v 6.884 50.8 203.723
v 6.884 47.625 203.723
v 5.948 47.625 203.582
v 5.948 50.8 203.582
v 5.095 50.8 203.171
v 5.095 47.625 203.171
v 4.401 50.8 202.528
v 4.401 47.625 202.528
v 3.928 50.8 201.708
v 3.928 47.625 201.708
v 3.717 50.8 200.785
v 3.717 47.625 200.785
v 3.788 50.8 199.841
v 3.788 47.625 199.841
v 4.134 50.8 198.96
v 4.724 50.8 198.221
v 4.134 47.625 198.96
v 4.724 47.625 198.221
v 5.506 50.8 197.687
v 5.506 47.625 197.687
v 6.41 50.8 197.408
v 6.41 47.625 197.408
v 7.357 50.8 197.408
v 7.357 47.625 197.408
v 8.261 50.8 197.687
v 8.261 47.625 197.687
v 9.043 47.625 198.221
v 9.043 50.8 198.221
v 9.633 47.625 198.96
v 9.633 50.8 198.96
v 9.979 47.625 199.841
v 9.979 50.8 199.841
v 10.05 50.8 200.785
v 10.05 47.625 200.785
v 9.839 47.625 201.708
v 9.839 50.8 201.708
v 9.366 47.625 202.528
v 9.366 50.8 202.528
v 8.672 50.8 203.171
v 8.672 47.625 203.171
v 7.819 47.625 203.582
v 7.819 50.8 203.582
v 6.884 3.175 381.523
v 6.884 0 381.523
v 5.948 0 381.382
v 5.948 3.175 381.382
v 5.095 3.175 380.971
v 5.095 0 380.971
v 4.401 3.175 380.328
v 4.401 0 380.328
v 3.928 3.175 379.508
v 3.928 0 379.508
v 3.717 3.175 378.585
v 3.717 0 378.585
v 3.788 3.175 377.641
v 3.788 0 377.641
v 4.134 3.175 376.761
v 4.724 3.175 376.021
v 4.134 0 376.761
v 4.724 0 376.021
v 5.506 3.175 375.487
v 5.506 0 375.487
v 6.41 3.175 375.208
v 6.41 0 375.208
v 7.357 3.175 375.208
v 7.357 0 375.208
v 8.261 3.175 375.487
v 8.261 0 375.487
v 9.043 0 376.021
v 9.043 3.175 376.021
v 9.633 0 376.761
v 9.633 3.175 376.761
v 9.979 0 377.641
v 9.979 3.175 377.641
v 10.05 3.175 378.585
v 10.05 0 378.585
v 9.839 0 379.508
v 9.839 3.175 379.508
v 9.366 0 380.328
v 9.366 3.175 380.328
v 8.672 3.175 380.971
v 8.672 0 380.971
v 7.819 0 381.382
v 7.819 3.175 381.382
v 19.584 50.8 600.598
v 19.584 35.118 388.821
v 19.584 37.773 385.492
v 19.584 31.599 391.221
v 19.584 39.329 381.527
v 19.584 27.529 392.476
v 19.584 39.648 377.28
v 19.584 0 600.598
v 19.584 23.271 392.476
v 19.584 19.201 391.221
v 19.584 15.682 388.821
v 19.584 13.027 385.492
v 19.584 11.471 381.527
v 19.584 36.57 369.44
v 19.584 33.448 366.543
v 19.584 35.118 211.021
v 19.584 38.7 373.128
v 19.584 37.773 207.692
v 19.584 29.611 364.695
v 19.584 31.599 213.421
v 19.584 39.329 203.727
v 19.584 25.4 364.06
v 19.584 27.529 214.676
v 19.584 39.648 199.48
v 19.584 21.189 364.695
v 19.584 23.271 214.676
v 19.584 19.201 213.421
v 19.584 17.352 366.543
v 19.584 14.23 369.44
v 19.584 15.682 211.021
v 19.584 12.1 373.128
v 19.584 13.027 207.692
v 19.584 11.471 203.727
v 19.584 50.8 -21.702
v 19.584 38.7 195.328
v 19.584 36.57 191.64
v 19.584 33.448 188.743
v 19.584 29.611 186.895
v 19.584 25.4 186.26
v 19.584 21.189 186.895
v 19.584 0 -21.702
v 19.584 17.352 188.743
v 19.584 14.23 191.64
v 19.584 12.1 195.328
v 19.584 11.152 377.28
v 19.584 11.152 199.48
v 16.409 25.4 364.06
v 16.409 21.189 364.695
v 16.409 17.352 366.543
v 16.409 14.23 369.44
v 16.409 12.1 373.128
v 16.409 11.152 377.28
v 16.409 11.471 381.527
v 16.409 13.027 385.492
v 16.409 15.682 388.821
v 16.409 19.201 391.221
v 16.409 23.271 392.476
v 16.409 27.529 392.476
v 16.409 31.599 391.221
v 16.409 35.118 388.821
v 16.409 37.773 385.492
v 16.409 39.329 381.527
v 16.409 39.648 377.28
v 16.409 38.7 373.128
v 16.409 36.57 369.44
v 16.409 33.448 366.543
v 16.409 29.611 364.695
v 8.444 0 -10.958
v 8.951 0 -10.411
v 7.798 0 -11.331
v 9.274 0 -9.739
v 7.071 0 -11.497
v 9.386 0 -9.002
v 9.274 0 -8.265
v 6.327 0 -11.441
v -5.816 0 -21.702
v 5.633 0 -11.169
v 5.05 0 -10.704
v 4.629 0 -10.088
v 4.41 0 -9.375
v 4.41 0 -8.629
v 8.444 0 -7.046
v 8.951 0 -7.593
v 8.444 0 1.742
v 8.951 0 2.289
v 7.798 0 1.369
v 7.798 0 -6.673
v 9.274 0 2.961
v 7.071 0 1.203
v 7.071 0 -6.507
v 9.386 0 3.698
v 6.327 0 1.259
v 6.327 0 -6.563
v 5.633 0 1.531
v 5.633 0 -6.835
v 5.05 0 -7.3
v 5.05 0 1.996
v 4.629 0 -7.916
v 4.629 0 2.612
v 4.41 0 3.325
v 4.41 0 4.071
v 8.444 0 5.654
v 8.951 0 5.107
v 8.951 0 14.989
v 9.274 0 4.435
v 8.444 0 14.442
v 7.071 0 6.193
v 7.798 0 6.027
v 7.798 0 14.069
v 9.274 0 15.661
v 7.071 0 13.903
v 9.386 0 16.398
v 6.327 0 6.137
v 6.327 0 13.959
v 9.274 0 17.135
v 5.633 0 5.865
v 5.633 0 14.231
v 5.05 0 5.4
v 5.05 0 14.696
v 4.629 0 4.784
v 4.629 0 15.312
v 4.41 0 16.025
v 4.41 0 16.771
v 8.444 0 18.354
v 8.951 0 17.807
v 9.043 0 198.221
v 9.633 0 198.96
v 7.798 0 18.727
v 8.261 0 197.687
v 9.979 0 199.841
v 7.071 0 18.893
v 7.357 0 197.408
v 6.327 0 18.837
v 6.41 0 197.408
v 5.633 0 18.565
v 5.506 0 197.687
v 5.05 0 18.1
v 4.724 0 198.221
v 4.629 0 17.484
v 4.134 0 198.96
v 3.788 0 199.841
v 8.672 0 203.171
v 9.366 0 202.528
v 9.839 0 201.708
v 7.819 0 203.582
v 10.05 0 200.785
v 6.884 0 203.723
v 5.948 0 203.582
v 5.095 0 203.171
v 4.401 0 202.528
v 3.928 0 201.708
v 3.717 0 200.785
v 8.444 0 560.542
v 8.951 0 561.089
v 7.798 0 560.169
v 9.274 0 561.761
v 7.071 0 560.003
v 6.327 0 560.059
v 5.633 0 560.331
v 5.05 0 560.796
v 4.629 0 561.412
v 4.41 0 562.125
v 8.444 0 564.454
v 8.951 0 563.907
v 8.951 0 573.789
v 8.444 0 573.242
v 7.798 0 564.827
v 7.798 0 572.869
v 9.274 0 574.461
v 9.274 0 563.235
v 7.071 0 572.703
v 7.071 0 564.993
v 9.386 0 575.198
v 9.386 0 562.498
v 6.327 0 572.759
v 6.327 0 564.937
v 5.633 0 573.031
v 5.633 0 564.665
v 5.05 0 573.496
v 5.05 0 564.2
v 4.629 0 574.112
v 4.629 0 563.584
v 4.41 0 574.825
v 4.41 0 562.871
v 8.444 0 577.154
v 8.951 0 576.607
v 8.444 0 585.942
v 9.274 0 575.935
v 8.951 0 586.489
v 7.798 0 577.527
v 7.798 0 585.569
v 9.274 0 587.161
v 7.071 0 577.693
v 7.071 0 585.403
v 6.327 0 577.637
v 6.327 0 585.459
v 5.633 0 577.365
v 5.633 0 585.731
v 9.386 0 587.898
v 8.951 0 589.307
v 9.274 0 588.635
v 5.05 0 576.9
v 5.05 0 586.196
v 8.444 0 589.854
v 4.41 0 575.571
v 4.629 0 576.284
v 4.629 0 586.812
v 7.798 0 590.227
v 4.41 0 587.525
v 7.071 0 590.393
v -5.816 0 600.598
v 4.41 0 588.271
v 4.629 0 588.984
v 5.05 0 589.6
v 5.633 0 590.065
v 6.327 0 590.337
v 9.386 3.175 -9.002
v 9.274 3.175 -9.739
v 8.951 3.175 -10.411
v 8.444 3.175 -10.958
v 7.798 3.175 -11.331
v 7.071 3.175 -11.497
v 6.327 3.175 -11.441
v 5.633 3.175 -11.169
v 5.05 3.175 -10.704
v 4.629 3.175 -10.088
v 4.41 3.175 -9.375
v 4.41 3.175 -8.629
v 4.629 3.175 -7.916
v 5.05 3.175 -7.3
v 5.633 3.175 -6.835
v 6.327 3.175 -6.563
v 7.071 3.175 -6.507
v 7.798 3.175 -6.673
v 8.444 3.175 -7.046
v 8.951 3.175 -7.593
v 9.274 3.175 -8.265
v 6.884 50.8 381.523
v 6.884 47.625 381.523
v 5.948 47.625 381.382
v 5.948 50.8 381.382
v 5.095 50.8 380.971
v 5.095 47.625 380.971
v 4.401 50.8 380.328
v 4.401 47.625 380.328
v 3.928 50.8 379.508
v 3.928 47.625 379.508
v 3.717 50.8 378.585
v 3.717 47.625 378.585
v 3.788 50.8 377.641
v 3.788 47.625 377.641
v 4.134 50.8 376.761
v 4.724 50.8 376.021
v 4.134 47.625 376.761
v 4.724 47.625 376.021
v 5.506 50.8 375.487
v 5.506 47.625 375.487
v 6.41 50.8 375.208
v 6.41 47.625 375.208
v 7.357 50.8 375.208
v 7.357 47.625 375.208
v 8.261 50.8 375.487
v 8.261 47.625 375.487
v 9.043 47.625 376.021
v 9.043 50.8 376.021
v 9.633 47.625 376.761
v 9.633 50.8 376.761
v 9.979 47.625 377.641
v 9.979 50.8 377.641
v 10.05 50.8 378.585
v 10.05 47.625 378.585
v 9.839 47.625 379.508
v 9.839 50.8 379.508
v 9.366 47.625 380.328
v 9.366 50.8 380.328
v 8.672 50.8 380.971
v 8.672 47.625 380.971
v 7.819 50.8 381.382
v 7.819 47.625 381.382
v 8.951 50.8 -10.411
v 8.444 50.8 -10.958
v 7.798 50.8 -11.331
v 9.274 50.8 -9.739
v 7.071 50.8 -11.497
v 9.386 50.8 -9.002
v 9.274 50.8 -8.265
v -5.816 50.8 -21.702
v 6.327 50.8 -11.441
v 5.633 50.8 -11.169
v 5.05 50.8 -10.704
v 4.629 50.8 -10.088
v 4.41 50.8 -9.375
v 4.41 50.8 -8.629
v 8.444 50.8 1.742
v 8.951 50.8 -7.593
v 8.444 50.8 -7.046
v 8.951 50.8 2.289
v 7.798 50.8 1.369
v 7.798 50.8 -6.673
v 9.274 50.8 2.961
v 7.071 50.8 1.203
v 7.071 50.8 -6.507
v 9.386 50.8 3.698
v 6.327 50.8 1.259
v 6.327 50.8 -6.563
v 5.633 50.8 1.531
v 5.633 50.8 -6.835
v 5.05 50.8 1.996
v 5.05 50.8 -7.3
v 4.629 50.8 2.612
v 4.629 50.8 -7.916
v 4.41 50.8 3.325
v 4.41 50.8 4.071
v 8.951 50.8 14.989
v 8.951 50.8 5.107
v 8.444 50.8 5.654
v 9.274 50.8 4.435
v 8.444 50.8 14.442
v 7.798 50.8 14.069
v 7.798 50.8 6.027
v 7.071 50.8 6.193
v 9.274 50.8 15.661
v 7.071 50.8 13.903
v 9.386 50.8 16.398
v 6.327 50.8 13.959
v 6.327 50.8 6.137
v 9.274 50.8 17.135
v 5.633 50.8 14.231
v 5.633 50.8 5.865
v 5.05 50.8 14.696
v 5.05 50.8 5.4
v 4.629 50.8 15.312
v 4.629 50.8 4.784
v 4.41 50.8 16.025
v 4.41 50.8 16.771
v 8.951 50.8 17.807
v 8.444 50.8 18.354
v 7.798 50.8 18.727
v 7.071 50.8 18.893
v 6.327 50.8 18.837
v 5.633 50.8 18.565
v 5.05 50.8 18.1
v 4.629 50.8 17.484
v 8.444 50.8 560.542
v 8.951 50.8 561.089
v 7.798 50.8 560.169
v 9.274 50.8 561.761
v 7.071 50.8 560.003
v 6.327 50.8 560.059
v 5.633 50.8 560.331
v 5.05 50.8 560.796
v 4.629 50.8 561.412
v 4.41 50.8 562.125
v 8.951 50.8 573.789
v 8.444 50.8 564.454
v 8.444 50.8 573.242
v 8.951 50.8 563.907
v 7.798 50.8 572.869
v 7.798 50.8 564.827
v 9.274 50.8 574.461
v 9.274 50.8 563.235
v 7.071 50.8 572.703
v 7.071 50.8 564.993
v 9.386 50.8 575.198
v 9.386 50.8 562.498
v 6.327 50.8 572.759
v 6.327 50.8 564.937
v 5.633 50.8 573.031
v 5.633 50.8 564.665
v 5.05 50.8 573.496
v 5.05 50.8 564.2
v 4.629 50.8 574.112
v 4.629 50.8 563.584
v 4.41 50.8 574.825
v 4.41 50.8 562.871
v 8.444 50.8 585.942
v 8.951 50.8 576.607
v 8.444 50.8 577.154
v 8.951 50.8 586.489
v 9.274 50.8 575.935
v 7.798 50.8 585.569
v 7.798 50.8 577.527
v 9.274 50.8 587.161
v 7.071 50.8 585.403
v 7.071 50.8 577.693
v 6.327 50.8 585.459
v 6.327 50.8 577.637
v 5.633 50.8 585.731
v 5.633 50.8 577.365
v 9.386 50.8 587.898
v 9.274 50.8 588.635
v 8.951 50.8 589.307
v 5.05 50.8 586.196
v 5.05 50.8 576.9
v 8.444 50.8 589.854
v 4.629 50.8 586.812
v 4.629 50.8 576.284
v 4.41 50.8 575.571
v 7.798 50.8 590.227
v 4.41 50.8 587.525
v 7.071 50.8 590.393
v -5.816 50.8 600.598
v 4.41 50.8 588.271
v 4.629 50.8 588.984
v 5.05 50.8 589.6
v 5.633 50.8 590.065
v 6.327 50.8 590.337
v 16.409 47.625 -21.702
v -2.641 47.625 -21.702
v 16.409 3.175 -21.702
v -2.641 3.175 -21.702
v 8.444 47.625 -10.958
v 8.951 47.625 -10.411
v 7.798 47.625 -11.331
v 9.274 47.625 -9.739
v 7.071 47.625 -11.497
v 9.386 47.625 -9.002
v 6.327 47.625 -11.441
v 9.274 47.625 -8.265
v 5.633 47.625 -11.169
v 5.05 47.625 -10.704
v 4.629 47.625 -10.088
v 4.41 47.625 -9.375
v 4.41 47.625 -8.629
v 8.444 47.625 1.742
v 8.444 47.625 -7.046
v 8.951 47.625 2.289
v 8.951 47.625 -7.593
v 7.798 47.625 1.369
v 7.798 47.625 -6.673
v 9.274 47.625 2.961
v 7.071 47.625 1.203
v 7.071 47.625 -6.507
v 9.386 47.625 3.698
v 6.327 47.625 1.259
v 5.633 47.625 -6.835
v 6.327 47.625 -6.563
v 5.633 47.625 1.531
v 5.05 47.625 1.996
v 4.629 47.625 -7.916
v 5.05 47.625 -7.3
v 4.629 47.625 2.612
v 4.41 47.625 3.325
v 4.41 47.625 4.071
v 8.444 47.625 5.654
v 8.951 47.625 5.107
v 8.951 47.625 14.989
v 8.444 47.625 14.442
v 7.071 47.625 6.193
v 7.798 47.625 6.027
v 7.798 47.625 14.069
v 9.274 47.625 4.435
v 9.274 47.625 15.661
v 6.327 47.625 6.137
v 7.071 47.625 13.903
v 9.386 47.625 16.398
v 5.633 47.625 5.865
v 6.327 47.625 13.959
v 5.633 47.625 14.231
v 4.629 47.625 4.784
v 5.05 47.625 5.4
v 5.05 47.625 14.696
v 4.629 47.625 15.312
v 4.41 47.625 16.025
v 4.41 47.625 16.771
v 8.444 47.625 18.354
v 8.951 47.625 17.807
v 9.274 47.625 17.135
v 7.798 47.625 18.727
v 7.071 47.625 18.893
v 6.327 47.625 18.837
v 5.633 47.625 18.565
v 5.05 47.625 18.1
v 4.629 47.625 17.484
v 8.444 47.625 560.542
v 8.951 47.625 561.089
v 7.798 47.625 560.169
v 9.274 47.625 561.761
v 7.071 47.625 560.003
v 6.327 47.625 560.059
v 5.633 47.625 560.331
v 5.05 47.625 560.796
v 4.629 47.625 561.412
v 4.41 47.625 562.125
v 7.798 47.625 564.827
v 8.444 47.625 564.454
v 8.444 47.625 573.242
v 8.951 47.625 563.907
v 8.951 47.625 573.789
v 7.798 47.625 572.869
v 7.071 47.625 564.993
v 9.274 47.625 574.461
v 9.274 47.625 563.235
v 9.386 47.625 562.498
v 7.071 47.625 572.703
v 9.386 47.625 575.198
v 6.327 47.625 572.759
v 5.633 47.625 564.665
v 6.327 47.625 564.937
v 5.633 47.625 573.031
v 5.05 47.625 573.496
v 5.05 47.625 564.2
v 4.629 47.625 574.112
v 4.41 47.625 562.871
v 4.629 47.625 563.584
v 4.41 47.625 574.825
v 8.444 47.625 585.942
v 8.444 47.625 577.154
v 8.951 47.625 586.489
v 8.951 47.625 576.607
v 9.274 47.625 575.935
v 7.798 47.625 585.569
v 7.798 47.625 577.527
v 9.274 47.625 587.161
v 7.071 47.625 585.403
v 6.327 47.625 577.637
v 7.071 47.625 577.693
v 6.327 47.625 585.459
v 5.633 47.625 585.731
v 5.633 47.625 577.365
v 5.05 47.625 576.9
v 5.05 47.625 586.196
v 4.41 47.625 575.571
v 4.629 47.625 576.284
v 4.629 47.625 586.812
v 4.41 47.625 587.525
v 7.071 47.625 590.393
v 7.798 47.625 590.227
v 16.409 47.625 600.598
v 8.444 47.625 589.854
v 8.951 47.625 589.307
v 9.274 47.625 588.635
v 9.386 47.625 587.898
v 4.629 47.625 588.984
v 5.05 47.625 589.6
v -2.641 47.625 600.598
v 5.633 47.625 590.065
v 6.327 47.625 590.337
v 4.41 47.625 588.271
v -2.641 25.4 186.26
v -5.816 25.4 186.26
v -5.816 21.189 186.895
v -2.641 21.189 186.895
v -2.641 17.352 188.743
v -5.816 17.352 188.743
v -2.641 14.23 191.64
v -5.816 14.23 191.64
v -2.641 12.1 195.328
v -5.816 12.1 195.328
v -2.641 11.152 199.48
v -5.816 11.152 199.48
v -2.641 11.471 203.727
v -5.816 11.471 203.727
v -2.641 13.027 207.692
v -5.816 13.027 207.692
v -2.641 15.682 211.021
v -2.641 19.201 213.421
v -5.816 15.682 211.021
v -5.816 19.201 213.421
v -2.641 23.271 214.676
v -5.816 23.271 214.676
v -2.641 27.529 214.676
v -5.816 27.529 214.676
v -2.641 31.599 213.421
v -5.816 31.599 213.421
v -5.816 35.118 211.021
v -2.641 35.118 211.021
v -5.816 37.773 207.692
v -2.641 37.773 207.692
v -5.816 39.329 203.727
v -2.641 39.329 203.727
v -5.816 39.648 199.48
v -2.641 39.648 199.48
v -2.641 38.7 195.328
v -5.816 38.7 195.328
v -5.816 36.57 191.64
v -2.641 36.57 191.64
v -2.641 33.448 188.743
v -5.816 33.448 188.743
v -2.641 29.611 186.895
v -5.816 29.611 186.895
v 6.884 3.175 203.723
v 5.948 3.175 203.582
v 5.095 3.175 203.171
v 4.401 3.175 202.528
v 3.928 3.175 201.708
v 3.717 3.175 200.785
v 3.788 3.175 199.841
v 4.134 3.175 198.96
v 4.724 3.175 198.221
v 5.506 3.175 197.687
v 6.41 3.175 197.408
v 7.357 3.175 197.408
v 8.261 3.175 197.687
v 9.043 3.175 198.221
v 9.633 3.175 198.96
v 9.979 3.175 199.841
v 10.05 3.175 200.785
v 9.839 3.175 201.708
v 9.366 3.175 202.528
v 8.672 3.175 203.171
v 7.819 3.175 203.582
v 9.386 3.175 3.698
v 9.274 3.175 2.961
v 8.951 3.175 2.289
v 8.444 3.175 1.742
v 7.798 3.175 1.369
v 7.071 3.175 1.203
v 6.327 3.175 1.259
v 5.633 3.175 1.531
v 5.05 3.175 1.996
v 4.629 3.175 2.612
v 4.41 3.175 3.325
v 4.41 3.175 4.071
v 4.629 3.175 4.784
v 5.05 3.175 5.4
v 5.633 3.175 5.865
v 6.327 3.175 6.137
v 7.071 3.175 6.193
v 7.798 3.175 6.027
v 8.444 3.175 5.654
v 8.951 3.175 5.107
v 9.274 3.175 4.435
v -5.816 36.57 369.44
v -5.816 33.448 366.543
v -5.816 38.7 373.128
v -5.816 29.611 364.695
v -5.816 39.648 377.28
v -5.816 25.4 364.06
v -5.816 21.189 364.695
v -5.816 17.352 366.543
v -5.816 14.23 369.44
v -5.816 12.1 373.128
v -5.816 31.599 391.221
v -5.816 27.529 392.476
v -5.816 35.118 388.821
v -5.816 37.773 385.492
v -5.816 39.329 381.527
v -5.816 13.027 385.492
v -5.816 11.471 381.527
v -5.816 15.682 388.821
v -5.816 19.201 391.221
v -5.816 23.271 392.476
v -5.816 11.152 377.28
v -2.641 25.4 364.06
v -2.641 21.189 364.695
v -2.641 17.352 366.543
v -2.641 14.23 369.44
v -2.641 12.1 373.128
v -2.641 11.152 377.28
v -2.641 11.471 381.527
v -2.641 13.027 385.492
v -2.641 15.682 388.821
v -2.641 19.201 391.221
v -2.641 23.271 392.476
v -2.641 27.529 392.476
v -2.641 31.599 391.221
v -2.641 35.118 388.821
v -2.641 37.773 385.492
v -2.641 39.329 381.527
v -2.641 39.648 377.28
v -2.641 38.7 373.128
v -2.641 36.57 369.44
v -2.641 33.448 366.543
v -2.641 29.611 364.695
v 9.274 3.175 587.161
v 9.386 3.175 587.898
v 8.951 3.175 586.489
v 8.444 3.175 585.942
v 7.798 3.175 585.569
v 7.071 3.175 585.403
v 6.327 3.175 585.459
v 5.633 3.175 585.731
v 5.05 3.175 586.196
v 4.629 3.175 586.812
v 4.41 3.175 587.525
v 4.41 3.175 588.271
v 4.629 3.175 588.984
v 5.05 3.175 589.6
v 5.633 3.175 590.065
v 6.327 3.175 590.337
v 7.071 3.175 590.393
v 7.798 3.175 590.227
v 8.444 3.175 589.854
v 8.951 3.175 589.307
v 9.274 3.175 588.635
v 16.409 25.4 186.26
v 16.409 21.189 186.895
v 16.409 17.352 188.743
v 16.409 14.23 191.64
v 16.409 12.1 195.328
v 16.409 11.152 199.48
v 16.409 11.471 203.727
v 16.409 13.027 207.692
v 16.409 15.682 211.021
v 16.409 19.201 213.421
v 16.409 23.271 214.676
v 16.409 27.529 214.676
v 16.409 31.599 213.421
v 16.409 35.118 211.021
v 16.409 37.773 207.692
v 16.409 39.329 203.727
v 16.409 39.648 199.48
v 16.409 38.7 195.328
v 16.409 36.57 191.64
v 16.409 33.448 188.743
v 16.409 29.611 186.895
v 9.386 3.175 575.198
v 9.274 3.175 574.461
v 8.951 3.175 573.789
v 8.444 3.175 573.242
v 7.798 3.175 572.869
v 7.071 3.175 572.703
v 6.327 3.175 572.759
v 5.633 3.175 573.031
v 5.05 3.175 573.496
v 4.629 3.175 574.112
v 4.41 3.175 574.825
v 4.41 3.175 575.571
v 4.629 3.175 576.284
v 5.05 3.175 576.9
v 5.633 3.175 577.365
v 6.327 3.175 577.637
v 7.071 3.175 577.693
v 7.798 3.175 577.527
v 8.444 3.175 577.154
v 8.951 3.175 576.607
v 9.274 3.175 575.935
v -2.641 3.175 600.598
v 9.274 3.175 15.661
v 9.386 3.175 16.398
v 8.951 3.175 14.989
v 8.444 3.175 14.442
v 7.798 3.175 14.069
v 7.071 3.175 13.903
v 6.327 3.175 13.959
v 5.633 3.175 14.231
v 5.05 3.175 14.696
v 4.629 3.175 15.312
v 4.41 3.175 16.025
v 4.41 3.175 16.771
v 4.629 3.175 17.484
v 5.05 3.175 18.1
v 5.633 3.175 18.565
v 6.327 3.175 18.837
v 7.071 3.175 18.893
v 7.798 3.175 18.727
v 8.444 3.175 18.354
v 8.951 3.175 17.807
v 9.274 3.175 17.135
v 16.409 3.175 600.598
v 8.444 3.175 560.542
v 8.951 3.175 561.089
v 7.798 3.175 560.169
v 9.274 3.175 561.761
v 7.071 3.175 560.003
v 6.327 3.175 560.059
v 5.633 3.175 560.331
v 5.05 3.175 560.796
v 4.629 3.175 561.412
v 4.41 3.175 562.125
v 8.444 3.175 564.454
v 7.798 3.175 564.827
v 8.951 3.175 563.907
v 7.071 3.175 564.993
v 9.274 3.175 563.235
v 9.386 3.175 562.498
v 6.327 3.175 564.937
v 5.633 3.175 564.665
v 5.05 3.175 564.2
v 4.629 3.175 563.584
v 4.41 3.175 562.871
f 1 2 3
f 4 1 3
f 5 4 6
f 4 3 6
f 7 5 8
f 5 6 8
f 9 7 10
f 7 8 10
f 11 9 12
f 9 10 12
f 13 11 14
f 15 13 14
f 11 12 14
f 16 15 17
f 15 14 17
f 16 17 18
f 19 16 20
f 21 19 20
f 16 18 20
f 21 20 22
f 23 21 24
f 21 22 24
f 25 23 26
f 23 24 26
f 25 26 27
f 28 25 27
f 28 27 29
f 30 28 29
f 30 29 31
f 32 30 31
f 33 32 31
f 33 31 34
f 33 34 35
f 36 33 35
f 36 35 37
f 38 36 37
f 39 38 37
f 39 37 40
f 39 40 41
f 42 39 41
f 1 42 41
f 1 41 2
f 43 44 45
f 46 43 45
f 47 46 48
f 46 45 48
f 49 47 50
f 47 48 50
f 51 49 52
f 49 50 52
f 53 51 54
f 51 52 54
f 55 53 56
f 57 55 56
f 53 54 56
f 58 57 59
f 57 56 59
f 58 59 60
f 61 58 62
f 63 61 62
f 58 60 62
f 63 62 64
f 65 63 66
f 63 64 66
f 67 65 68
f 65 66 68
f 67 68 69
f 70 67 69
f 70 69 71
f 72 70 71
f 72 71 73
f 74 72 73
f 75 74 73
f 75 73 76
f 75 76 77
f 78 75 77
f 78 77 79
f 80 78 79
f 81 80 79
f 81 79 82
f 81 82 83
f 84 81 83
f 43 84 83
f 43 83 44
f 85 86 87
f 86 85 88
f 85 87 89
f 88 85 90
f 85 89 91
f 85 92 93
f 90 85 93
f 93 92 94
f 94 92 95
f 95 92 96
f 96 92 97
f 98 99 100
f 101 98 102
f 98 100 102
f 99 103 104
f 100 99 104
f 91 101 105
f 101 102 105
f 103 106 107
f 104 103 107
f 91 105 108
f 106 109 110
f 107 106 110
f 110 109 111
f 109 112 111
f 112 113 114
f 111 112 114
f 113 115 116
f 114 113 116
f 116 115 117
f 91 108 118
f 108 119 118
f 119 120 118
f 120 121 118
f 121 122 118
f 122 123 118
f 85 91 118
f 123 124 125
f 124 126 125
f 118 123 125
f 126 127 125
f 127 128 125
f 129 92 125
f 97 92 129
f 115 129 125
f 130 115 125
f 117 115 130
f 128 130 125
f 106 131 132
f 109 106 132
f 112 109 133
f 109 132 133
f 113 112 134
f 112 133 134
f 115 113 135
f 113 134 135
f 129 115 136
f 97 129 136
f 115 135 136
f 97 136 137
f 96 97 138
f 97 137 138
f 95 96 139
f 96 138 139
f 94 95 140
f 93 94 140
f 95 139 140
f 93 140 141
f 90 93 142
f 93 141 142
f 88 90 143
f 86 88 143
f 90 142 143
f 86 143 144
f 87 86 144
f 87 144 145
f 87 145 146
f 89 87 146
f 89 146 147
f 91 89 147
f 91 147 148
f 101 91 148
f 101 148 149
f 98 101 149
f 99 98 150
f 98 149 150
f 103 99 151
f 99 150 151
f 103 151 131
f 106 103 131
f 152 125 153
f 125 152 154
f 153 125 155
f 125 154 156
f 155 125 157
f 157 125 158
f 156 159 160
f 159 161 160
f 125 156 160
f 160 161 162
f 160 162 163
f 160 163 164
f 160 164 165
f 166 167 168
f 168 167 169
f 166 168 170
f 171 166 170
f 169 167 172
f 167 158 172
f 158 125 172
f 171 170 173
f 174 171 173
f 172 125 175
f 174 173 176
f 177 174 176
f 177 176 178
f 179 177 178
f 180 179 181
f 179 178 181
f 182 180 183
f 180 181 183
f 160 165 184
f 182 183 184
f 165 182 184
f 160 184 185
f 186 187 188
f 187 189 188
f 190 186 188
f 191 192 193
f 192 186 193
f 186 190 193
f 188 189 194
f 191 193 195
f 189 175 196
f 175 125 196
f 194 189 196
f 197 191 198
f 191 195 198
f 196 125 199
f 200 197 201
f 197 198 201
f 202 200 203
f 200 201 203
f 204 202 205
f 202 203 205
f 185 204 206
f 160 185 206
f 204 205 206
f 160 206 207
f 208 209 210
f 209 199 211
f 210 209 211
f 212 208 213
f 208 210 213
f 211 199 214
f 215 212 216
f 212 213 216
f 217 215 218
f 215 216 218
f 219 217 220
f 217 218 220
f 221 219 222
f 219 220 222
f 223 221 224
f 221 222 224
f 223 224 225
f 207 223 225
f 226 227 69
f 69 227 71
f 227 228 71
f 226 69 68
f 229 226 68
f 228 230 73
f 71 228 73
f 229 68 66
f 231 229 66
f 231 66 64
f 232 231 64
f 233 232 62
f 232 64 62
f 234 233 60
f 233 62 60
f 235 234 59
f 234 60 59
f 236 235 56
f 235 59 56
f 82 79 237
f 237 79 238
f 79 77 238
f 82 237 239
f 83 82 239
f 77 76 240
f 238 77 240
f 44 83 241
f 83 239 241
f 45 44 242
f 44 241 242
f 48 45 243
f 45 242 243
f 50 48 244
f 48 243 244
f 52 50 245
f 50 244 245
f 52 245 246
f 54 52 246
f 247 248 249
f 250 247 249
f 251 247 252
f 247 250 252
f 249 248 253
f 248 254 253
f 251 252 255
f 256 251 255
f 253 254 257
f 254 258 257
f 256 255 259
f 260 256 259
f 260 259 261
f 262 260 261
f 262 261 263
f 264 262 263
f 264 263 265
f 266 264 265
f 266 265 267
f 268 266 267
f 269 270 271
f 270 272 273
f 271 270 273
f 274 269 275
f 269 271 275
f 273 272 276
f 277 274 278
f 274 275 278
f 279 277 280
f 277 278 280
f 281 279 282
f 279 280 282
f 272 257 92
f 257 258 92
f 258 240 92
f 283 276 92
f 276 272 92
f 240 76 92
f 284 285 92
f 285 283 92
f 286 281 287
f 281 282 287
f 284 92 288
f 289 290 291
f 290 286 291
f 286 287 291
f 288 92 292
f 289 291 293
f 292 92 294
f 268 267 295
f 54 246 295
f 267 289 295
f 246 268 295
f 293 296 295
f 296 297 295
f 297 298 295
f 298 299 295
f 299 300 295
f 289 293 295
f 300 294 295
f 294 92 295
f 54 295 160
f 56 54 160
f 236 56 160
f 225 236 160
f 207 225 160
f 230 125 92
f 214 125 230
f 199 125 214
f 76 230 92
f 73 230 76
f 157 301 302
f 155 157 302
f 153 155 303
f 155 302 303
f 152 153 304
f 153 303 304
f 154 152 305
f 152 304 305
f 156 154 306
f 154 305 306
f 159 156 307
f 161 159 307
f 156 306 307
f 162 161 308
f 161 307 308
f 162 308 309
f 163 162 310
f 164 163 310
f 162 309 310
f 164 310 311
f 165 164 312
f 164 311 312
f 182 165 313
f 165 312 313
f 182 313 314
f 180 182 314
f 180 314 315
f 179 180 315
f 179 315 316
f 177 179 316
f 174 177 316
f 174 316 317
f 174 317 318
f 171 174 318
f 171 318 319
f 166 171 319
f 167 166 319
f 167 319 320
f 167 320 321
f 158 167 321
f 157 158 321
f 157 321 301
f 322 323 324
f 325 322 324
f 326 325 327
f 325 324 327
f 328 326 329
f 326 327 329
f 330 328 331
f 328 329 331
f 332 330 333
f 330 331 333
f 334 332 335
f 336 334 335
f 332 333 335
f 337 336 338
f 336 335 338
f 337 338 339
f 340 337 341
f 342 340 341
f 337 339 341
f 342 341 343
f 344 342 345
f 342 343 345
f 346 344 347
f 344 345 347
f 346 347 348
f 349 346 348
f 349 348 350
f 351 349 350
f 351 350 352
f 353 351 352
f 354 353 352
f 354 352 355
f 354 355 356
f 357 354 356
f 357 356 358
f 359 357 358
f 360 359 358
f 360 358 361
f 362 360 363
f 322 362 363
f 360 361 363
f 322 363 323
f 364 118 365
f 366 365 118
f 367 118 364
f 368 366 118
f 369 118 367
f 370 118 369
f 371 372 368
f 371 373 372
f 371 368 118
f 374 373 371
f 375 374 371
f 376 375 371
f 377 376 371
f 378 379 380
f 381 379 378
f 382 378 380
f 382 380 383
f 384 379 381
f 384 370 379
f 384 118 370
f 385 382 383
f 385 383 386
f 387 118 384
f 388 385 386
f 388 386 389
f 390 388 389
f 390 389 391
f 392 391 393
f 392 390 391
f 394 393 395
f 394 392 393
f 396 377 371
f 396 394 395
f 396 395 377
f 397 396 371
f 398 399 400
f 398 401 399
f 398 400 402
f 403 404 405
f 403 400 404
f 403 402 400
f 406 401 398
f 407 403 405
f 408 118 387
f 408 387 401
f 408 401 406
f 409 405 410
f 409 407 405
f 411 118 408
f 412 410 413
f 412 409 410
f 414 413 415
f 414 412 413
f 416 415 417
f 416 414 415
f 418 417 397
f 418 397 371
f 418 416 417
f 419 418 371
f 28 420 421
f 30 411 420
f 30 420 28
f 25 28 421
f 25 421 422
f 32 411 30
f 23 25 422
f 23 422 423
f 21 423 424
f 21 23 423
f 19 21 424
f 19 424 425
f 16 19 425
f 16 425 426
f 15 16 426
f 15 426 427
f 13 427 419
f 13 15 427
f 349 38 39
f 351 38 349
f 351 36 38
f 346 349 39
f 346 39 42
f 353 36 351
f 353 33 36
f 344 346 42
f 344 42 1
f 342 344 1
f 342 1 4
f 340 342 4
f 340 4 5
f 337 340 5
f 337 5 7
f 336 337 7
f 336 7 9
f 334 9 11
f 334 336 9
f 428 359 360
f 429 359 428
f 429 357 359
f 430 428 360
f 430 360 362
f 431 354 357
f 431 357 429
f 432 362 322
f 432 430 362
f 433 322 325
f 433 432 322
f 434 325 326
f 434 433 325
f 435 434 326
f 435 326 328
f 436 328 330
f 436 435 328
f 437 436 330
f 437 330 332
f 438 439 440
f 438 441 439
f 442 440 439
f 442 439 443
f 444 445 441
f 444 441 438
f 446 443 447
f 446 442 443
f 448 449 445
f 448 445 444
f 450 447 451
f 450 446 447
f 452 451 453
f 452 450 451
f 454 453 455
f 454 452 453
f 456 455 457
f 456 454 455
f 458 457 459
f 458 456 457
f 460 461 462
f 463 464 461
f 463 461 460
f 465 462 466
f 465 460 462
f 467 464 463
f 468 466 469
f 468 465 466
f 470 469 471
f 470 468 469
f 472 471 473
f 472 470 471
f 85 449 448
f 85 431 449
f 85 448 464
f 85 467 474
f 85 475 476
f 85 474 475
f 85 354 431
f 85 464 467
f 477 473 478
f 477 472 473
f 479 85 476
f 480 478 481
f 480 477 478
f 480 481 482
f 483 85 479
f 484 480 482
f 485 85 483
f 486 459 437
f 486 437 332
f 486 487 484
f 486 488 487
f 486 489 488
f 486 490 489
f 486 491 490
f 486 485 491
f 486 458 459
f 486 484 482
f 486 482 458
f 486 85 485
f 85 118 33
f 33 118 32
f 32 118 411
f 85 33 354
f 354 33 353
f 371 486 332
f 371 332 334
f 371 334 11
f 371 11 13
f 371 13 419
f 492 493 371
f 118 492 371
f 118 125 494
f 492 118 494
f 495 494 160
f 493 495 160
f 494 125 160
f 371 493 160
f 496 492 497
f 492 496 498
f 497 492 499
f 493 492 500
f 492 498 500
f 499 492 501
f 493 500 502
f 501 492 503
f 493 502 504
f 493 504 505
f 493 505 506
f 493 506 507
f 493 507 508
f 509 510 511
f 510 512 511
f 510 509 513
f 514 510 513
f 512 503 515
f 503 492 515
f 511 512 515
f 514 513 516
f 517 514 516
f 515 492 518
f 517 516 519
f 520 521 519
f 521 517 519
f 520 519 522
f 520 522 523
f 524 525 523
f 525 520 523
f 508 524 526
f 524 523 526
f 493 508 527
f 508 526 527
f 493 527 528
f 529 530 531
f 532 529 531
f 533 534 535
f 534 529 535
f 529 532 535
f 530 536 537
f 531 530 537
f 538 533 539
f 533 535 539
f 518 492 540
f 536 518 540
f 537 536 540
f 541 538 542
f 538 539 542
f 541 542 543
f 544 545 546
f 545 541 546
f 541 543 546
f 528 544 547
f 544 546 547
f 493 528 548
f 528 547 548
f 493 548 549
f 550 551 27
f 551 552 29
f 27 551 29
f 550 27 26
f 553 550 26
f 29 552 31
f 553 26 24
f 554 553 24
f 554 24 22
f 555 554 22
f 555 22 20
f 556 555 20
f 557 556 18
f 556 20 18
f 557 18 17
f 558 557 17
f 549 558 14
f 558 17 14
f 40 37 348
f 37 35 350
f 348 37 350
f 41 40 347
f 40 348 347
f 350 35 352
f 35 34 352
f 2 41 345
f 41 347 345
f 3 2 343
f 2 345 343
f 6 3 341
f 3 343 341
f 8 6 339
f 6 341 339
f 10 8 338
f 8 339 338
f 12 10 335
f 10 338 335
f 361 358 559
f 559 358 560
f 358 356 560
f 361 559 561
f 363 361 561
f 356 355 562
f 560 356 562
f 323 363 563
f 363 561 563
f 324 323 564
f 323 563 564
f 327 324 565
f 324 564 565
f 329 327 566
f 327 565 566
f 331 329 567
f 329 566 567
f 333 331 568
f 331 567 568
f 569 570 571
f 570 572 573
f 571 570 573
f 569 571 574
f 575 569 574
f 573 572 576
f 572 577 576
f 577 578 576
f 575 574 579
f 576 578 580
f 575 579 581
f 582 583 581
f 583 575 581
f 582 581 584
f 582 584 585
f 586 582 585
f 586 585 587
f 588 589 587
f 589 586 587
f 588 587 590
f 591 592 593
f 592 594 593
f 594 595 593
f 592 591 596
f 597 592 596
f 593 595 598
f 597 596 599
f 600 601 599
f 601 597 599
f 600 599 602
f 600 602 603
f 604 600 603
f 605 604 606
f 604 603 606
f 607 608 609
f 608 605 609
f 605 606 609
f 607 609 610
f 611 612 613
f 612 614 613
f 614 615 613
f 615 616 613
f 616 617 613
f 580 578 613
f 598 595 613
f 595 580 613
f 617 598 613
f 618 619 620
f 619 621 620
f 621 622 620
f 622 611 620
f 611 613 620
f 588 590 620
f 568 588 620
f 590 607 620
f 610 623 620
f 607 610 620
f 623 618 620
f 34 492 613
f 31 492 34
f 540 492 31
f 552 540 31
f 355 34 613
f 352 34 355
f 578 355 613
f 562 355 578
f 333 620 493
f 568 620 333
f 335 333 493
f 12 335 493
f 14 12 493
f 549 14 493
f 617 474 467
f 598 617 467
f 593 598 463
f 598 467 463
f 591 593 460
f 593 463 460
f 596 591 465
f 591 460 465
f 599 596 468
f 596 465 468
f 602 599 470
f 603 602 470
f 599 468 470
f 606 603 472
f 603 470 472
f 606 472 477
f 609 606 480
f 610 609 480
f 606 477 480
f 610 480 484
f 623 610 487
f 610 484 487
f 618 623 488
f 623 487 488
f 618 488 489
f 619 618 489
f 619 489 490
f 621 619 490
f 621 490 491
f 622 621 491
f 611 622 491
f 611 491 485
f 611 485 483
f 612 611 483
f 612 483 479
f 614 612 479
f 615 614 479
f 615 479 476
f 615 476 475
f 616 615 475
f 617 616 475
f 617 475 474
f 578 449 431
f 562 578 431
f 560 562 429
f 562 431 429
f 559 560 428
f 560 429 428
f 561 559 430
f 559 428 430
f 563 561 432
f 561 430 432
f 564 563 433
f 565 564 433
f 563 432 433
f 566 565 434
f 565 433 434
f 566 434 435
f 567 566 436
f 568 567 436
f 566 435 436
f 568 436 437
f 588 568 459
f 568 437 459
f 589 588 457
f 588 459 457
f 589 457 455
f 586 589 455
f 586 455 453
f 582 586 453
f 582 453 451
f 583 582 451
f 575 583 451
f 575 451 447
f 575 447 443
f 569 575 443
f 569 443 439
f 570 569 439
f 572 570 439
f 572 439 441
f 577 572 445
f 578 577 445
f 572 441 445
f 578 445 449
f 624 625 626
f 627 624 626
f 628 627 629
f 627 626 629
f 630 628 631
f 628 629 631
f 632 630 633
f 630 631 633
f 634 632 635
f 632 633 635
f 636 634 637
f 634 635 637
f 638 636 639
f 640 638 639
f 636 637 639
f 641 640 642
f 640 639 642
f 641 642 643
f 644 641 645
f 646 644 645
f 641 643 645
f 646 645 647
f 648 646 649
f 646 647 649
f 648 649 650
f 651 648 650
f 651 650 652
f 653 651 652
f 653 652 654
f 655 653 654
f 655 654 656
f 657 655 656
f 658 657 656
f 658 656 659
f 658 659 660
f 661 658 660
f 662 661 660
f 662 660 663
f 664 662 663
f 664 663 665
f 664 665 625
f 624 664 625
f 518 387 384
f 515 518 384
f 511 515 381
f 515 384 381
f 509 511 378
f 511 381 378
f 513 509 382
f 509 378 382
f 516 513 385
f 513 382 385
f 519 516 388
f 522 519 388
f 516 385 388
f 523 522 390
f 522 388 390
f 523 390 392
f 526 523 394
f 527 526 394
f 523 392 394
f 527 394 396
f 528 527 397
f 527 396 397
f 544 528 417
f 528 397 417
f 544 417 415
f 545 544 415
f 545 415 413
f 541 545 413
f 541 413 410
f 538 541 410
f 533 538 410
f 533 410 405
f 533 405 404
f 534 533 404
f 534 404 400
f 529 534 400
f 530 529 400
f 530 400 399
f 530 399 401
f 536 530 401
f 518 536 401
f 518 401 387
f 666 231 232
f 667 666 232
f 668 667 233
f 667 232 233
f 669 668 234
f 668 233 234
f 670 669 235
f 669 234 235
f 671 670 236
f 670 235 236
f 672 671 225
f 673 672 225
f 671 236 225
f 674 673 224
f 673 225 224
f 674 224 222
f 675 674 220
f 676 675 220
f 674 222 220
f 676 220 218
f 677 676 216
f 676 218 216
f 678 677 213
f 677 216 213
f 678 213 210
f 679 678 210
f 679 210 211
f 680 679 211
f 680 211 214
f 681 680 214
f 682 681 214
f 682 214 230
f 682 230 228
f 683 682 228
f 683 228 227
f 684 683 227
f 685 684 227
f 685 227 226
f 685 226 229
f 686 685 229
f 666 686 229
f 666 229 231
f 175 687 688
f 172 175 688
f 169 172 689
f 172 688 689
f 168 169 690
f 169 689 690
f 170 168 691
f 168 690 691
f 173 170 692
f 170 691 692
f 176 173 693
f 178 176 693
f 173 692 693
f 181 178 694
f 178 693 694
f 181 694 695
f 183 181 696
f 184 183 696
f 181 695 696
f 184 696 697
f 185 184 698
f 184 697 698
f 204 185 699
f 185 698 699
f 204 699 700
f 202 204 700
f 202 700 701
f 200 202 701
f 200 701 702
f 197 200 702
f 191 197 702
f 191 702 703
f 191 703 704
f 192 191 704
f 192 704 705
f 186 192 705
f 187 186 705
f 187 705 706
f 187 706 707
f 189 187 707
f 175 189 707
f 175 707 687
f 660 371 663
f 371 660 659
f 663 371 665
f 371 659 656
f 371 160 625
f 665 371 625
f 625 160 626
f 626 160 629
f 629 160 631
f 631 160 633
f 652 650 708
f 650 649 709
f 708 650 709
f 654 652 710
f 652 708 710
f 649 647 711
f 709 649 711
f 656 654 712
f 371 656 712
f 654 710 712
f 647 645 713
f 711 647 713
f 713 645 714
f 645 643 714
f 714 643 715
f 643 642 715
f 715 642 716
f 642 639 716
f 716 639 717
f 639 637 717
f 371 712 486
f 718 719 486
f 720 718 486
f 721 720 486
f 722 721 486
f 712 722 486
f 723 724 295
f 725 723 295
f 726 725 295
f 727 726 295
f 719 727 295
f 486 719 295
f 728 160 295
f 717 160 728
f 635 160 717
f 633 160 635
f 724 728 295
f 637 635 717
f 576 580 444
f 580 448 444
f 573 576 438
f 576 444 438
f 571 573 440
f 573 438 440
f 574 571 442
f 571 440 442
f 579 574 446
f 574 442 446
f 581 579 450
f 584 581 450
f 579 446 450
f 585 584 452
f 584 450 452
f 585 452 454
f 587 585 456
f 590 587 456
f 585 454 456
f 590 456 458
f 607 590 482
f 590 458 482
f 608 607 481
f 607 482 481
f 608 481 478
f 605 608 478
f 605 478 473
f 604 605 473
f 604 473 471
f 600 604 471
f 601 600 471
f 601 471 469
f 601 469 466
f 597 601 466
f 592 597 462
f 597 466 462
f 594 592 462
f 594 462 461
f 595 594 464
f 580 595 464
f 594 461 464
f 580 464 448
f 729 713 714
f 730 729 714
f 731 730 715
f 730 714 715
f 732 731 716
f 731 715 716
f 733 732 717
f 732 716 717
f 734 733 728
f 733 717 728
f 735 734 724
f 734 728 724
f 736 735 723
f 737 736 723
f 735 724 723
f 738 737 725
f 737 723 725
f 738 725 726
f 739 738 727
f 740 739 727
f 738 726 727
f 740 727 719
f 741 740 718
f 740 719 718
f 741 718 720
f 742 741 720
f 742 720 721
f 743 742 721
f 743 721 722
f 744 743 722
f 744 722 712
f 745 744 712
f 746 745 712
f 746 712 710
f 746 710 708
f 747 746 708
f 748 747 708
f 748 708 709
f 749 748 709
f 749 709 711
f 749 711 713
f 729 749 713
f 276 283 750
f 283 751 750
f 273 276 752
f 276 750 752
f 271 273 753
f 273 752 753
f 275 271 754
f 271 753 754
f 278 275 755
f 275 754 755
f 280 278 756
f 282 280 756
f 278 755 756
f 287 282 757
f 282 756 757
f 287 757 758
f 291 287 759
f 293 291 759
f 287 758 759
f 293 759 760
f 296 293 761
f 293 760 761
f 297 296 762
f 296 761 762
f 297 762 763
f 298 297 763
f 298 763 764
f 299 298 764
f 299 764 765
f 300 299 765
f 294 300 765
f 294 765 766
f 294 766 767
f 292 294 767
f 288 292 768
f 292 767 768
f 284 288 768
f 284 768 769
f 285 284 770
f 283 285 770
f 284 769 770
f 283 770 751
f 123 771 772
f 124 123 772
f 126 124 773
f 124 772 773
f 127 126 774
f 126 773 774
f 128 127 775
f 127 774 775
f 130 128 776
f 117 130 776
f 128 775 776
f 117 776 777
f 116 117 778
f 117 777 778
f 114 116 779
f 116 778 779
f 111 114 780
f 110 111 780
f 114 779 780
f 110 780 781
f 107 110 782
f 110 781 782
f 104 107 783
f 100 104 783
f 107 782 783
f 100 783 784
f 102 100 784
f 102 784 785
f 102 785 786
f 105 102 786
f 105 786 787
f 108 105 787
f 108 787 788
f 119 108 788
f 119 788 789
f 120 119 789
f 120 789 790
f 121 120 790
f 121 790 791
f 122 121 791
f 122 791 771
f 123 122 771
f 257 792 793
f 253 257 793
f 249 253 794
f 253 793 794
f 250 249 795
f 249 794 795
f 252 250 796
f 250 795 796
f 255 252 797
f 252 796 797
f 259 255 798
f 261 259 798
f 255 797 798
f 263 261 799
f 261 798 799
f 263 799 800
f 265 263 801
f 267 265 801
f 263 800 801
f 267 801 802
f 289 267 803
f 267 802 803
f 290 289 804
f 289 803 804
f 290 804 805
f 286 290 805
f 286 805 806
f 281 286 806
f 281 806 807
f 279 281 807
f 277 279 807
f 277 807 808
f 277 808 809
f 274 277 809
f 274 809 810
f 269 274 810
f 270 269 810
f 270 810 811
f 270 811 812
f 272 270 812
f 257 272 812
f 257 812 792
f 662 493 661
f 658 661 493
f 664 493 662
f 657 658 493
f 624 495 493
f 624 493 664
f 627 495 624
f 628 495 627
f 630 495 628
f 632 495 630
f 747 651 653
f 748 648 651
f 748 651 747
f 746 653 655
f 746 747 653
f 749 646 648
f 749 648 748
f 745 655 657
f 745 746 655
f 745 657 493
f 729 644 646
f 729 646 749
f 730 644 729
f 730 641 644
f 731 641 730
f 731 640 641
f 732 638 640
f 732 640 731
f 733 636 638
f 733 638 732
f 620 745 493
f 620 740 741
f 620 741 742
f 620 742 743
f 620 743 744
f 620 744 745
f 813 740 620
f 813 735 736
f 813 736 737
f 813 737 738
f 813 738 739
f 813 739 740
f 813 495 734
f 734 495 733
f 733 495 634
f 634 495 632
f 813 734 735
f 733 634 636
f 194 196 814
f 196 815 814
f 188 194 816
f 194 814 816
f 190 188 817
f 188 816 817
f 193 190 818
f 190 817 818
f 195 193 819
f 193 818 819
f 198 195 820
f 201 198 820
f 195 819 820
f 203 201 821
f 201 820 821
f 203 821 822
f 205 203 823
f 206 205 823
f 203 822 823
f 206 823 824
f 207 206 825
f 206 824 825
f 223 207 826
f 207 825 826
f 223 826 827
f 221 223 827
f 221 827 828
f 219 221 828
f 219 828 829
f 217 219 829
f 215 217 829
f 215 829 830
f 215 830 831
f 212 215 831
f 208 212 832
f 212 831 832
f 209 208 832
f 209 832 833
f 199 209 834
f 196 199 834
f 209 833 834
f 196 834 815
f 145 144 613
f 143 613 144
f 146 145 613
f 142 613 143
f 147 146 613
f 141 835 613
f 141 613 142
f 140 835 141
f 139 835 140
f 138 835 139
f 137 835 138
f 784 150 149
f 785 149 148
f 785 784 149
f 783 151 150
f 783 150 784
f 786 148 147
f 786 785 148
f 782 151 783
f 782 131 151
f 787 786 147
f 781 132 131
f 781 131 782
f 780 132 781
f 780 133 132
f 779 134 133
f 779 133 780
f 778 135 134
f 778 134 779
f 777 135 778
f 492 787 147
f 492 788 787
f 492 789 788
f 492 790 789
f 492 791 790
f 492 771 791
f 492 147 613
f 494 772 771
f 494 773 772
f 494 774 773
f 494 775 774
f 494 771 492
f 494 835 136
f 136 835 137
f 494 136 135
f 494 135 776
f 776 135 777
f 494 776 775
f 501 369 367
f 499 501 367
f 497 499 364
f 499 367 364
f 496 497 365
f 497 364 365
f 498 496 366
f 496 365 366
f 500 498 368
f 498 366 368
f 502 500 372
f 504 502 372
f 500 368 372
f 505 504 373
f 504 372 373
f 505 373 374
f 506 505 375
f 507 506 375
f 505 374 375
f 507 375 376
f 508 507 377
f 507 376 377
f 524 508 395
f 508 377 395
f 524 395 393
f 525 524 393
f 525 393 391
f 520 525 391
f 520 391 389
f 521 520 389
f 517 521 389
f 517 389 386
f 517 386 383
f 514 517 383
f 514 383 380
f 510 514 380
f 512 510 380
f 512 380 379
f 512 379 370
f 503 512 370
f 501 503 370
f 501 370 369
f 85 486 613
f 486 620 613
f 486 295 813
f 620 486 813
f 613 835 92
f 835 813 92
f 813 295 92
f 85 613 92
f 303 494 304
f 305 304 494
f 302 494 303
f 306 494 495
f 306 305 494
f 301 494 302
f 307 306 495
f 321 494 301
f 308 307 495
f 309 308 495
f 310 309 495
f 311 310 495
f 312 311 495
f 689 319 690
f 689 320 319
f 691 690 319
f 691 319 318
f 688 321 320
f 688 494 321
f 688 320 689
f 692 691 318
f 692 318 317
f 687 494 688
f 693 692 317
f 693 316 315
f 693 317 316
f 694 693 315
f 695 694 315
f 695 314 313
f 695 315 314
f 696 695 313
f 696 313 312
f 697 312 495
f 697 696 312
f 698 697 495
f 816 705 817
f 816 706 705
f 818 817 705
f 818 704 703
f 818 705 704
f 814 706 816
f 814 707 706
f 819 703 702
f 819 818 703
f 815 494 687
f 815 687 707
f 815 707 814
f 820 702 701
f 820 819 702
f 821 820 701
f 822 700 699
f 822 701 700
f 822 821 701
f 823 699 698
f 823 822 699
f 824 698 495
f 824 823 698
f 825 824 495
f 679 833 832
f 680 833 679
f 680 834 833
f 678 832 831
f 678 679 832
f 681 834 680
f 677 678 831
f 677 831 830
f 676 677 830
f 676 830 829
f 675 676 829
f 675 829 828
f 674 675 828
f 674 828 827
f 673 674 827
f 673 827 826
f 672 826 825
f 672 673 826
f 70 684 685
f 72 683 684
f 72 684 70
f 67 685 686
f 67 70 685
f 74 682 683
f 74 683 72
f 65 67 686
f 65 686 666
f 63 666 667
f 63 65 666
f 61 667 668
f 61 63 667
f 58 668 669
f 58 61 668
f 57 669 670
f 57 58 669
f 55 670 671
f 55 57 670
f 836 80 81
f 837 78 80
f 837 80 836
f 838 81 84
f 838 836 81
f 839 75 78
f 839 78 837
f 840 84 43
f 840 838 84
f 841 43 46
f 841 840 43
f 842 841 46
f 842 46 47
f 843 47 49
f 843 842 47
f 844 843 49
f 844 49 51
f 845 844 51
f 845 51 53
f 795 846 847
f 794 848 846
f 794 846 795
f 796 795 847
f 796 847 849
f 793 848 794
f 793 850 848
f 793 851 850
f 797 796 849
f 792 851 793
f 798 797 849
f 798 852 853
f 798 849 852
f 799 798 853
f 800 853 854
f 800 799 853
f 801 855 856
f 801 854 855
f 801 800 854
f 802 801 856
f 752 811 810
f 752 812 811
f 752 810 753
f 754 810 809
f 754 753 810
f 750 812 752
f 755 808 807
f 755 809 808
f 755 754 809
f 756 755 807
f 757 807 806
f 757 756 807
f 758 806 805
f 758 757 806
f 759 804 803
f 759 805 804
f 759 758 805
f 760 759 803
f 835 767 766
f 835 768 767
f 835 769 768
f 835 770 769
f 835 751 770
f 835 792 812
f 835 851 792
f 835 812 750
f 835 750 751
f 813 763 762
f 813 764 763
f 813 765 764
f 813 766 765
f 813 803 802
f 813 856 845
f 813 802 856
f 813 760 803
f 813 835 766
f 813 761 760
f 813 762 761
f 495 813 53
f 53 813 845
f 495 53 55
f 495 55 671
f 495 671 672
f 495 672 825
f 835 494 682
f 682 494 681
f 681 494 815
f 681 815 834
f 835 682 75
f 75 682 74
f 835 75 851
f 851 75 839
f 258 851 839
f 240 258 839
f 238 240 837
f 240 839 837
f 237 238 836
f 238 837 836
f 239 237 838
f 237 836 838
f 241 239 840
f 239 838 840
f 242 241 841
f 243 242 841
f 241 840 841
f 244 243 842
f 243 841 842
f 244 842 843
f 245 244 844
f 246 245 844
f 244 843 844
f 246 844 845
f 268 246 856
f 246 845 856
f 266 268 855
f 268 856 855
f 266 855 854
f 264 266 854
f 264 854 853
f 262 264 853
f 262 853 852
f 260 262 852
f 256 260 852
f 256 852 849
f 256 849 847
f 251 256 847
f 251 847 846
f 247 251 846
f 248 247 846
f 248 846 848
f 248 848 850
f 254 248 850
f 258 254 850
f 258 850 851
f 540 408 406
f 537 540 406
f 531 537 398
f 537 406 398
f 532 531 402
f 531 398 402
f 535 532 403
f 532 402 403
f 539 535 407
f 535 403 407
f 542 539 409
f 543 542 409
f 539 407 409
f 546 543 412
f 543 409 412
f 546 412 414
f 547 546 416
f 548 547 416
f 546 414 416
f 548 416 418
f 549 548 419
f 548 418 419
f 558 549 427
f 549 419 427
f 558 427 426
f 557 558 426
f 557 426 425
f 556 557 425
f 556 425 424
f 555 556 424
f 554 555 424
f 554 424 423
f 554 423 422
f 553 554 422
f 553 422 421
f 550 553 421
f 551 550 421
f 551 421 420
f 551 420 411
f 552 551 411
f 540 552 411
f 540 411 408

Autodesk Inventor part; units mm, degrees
ref_plane "YZ Plane" through (0, 0, 0) normal (1, 0, 0) x (0, 1, 0)
ref_plane "XZ Plane" through (0, 0, 0) normal (0, 1, 0) x (-1, 0, 0)
ref_plane "XY Plane" through (0, 0, 0) normal (0, 0, 1) x (1, 0, 0)
sketch "Sketch1" plane through (0, 0, 0) normal (0, 1, 0) x (-1, 0, 0)
  line L0 (5.8164, 600.598) -> (-19.5836, 600.598)
  line L1 (-19.5836, 600.598) -> (-19.5836, -21.702)
  line L2 (-19.5836, -21.702) -> (5.8164, -21.702)
  line L3 (5.8164, -21.702) -> (5.8164, 600.598)
  point P0 (0, 0)
  dimension "d0" = 25.4
  dimension "d1" = 622.3
extrude "Extrusion1" add sketch "Sketch1" along normal blind 50.8
shell "Shell1" thickness 3.175 removed faces 2 at (2.6503, 33.8667, 600.598) at (11.117, 33.8667, -21.702)
sketch "Sketch2" plane through (0, 50.8, 0) normal (0, 1, 0) x (1, 0, 0)
  circle A0 centre (6.8836, -587.898) radius 2.5019
  line L0 (-5.8164, -600.598) -> (19.5836, -600.598) projected
  circle A1 centre (6.8836, -575.198) radius 2.5019
  circle A2 centre (6.8836, -562.498) radius 2.5019
  circle A3 centre (6.8836, 9.002) radius 2.5019
  circle A4 centre (6.8836, -3.698) radius 2.5019
  circle A5 centre (6.8836, -16.398) radius 2.5019
  line L1 (19.5836, 21.702) -> (-5.8164, 21.702) projected
  point P0 (0, 0)
  dimension "d5" = 5.0038
  dimension "d6" = 12.7
  dimension "d7" = 5.0038
  dimension "d8" = 5.0038
  dimension "d9" = 12.7
  dimension "d10" = 12.7
  dimension "d11" = 5.0038
  dimension "d12" = 5.0038
  dimension "d13" = 5.0038
  dimension "d14" = 12.7
  dimension "d15" = 12.7
  dimension "d16" = 12.7
extrude "Extrusion2" cut sketch "Sketch2" against normal blind 50.8
sketch "Sketch3" plane through (19.5836, 0, 600.598) normal (1, 0, 0) x (0, 0, -1)
  line L0 (0, 0) -> (0, 50.8) construction
  line L1 (622.3, 0) -> (622.3, 50.8) construction
  circle A0 centre (222.25, 25.4) radius 14.2875
  circle A1 centre (400.05, 25.4) radius 14.2875
  point P0 (600.598, 0)
  dimension "d21" = 28.575
  dimension "d22" = 28.575
hole "Hole1" at (19.5836, 25.4, 378.348) at (19.5836, 25.4, 200.548) direction (-1, 0, 0) diameter 28.575 end through all
sketch "Sketch4" plane through (0, 50.8, 0) normal (0, 1, 0) x (1, 0, 0)
  circle A0 centre (6.8836, -378.348) radius 3.175
  line L0 (-5.8164, -600.598) -> (19.5836, -600.598) projected
  circle A1 centre (6.8836, -200.548) radius 3.175
  line L1 (19.5836, 21.702) -> (-5.8164, 21.702) projected
  point P0 (0, 0)
  point P1 (6.8836, -600.598)
  dimension "d30" = 6.35
  dimension "d31" = 222.25
  dimension "d32" = 6.35
  dimension "d33" = 222.25
hole "Hole2" at (6.8836, 50.8, 378.348) at (6.8836, 50.8, 200.548) direction (0, -1, 0) diameter 6.35 end through all
properties part number "middle_alum_swerve" material "Aluminum 6061"
